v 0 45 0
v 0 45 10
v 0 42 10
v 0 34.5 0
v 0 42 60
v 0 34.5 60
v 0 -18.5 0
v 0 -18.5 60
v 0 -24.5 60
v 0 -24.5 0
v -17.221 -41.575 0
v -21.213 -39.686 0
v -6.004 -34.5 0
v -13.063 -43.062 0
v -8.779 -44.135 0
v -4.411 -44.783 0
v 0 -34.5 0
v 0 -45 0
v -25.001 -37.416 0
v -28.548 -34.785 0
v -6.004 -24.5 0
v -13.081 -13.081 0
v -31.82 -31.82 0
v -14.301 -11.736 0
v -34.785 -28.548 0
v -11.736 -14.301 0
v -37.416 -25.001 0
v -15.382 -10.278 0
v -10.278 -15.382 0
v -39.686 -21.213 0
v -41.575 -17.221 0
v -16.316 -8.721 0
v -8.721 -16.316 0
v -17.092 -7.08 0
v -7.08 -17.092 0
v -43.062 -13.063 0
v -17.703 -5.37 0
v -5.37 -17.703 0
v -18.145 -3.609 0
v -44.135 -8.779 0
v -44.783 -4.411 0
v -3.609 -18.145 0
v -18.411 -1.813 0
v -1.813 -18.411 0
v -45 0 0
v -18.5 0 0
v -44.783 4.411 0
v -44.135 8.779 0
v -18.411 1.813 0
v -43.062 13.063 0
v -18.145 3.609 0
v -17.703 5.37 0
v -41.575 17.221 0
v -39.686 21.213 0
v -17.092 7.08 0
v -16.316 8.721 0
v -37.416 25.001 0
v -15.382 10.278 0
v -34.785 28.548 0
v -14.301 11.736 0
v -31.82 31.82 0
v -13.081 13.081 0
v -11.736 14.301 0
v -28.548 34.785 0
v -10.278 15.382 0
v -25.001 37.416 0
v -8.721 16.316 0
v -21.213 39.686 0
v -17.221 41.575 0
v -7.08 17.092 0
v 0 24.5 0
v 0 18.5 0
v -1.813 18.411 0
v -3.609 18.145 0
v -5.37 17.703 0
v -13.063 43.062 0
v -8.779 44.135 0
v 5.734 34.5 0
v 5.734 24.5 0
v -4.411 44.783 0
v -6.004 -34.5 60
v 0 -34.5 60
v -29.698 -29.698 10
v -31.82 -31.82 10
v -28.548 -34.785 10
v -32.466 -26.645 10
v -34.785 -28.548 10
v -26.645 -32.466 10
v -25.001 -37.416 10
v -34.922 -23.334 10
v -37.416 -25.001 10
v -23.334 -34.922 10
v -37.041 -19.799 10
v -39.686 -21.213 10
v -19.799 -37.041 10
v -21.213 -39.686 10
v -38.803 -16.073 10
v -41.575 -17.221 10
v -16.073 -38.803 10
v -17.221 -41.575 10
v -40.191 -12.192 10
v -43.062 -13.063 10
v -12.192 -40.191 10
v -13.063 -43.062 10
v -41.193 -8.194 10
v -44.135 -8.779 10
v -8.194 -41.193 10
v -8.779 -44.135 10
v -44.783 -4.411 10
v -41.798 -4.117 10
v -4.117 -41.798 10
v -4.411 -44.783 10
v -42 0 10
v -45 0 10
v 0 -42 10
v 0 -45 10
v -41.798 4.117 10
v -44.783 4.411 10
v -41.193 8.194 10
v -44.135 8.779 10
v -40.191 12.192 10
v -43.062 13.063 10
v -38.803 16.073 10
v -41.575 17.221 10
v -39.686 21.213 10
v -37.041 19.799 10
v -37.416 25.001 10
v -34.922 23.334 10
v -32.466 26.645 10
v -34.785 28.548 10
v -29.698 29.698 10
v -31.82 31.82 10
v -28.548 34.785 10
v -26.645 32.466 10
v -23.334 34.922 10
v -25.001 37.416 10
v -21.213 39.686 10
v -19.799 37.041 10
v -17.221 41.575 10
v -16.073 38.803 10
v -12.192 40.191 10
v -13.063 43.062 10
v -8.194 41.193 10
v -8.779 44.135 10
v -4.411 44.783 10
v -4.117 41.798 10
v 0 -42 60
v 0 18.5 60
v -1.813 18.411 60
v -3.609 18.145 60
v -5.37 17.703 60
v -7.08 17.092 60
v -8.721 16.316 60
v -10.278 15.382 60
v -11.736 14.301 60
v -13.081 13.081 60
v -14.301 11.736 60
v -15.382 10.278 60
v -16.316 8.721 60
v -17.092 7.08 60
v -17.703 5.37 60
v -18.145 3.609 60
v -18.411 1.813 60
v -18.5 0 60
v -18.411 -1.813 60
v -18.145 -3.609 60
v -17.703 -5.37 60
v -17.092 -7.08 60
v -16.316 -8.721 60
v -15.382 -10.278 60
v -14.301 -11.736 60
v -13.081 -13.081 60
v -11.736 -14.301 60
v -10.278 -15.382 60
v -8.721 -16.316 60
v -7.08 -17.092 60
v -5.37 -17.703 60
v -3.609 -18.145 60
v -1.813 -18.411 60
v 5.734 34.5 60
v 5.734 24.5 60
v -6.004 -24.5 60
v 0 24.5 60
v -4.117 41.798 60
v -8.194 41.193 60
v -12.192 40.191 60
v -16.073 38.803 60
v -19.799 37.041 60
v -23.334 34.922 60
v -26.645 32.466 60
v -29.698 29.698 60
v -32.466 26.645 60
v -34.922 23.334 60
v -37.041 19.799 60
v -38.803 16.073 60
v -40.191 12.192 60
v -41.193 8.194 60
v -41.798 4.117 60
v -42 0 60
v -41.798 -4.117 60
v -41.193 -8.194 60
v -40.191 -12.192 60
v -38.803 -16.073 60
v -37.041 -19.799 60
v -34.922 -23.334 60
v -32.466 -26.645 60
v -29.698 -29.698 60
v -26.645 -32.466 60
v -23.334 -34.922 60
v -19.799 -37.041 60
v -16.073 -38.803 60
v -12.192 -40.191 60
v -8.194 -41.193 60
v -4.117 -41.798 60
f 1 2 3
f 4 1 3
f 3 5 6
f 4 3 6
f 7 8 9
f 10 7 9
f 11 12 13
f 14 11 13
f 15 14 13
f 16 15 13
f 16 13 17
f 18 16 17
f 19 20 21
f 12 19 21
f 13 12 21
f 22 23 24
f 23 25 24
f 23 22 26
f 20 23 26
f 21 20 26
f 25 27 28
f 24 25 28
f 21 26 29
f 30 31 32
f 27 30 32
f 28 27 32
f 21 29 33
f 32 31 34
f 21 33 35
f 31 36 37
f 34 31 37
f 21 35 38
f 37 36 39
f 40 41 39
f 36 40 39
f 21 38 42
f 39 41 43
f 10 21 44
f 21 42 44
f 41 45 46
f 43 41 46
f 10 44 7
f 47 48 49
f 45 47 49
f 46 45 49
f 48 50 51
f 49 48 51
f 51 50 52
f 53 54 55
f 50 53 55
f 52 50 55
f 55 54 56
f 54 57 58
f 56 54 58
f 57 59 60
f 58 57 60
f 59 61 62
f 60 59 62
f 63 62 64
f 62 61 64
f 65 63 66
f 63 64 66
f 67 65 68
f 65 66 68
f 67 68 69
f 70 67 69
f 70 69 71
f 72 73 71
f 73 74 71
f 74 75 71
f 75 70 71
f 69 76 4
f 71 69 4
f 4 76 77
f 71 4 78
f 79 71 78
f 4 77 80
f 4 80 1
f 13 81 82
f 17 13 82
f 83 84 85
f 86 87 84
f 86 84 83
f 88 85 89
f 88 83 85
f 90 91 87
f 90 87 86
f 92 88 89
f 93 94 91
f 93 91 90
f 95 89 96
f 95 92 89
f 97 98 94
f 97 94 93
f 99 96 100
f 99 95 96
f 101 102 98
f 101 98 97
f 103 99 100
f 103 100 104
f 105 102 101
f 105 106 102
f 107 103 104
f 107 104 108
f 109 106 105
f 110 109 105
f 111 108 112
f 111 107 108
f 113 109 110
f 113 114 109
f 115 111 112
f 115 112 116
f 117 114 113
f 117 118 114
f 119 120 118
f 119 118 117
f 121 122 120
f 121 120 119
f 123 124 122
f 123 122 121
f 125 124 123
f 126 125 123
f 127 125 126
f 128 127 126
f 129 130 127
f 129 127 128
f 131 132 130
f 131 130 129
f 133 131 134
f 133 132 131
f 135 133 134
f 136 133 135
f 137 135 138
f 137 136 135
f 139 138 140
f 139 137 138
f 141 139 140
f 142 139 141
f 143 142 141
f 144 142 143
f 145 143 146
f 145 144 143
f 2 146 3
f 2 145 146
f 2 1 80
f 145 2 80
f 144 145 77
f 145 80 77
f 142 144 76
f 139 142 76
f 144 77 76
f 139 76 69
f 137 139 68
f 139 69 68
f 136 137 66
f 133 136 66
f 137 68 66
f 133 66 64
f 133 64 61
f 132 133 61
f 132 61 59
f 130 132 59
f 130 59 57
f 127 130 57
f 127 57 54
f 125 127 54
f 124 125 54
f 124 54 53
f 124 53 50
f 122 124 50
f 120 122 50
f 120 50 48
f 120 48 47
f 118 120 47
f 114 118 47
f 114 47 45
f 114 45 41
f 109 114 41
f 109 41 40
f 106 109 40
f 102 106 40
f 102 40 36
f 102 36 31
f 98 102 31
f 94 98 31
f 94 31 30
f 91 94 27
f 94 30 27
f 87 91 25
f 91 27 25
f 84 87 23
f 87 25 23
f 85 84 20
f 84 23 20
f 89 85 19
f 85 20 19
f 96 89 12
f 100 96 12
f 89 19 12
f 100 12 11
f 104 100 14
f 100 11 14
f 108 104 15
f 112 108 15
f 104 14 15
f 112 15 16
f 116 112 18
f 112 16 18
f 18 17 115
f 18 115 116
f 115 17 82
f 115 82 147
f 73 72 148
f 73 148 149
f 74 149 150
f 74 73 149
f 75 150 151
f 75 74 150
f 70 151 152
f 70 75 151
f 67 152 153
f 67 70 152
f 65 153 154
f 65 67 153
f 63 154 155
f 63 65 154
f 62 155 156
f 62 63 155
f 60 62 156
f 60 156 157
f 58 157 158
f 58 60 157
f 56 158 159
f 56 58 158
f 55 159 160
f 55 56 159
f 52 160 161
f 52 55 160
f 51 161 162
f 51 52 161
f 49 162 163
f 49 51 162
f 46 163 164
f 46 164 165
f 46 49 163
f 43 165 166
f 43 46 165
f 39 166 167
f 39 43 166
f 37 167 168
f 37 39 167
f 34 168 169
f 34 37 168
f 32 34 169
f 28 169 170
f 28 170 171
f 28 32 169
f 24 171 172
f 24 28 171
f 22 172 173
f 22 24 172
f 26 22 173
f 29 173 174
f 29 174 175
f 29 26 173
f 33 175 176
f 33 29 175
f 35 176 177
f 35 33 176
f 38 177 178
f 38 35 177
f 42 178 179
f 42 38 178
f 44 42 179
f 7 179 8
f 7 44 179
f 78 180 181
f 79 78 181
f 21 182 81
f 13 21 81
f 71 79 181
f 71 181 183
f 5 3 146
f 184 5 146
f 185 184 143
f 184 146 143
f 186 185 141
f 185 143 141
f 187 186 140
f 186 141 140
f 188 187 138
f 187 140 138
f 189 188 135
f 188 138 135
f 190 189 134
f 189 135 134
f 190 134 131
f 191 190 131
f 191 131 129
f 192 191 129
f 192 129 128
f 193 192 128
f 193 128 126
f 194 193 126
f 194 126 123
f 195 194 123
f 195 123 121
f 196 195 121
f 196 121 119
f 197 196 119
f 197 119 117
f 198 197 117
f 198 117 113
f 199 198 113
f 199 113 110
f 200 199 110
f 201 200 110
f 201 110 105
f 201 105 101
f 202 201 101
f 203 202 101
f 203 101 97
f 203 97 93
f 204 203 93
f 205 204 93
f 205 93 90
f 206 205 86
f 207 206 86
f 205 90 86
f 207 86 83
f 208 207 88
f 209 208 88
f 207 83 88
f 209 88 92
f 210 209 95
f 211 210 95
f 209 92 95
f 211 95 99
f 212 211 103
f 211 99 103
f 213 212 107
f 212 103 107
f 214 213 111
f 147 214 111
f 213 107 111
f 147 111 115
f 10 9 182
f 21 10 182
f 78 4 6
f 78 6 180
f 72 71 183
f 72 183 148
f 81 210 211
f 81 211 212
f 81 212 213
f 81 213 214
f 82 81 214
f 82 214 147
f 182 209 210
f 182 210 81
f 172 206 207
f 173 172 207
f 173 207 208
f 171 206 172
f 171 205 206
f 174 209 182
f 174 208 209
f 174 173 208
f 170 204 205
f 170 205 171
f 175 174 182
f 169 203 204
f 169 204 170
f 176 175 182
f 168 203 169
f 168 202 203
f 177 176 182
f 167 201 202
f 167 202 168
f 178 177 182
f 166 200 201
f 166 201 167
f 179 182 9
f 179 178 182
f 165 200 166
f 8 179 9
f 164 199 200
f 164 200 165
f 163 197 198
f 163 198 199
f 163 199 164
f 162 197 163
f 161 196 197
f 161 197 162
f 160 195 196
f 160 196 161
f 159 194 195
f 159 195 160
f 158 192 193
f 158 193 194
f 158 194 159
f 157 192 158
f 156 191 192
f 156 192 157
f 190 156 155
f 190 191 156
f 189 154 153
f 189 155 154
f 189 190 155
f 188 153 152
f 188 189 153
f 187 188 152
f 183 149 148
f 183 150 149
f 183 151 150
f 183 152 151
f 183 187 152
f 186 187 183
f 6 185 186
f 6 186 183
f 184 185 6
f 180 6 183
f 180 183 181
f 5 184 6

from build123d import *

# Parameters (mm, degrees)
F0_R     = 45
F0_R_2   = 18.5
F1_DEPTH = 10
F2_R     = 42
F2_R_2   = 18.5
F3_DEPTH = 50
F5_DEPTH = 79.80825


with BuildPart() as f1:
    # F0 (on Top) → F1 (new body)
    with BuildSketch(Plane.XY):
        Circle(F0_R)
        Circle(F0_R_2, mode=Mode.SUBTRACT)
    extrude(amount=F1_DEPTH)

    # F2 (on face) → F3 (join)
    with BuildSketch(Plane.XY.offset(10)):
        Circle(F2_R)
        Circle(F2_R_2, mode=Mode.SUBTRACT)
    extrude(amount=F3_DEPTH)

    # F4 (on face) → F5 (cut)
    with BuildSketch(Plane.XY.offset(60)):
        Polygon((64.068409, 63.324335), (0, 63.324335), (0, 34.5), (5.733575, 34.5), (5.733575, 24.5), (0, 24.5), (0, -24.5), (-6.004329, -24.5), (-6.004329, -34.5), (0, -34.5), (0, -52.819867), (64.068409, -52.819867), align=None)
    extrude(amount=-F5_DEPTH, mode=Mode.SUBTRACT)


solid = f1.part
